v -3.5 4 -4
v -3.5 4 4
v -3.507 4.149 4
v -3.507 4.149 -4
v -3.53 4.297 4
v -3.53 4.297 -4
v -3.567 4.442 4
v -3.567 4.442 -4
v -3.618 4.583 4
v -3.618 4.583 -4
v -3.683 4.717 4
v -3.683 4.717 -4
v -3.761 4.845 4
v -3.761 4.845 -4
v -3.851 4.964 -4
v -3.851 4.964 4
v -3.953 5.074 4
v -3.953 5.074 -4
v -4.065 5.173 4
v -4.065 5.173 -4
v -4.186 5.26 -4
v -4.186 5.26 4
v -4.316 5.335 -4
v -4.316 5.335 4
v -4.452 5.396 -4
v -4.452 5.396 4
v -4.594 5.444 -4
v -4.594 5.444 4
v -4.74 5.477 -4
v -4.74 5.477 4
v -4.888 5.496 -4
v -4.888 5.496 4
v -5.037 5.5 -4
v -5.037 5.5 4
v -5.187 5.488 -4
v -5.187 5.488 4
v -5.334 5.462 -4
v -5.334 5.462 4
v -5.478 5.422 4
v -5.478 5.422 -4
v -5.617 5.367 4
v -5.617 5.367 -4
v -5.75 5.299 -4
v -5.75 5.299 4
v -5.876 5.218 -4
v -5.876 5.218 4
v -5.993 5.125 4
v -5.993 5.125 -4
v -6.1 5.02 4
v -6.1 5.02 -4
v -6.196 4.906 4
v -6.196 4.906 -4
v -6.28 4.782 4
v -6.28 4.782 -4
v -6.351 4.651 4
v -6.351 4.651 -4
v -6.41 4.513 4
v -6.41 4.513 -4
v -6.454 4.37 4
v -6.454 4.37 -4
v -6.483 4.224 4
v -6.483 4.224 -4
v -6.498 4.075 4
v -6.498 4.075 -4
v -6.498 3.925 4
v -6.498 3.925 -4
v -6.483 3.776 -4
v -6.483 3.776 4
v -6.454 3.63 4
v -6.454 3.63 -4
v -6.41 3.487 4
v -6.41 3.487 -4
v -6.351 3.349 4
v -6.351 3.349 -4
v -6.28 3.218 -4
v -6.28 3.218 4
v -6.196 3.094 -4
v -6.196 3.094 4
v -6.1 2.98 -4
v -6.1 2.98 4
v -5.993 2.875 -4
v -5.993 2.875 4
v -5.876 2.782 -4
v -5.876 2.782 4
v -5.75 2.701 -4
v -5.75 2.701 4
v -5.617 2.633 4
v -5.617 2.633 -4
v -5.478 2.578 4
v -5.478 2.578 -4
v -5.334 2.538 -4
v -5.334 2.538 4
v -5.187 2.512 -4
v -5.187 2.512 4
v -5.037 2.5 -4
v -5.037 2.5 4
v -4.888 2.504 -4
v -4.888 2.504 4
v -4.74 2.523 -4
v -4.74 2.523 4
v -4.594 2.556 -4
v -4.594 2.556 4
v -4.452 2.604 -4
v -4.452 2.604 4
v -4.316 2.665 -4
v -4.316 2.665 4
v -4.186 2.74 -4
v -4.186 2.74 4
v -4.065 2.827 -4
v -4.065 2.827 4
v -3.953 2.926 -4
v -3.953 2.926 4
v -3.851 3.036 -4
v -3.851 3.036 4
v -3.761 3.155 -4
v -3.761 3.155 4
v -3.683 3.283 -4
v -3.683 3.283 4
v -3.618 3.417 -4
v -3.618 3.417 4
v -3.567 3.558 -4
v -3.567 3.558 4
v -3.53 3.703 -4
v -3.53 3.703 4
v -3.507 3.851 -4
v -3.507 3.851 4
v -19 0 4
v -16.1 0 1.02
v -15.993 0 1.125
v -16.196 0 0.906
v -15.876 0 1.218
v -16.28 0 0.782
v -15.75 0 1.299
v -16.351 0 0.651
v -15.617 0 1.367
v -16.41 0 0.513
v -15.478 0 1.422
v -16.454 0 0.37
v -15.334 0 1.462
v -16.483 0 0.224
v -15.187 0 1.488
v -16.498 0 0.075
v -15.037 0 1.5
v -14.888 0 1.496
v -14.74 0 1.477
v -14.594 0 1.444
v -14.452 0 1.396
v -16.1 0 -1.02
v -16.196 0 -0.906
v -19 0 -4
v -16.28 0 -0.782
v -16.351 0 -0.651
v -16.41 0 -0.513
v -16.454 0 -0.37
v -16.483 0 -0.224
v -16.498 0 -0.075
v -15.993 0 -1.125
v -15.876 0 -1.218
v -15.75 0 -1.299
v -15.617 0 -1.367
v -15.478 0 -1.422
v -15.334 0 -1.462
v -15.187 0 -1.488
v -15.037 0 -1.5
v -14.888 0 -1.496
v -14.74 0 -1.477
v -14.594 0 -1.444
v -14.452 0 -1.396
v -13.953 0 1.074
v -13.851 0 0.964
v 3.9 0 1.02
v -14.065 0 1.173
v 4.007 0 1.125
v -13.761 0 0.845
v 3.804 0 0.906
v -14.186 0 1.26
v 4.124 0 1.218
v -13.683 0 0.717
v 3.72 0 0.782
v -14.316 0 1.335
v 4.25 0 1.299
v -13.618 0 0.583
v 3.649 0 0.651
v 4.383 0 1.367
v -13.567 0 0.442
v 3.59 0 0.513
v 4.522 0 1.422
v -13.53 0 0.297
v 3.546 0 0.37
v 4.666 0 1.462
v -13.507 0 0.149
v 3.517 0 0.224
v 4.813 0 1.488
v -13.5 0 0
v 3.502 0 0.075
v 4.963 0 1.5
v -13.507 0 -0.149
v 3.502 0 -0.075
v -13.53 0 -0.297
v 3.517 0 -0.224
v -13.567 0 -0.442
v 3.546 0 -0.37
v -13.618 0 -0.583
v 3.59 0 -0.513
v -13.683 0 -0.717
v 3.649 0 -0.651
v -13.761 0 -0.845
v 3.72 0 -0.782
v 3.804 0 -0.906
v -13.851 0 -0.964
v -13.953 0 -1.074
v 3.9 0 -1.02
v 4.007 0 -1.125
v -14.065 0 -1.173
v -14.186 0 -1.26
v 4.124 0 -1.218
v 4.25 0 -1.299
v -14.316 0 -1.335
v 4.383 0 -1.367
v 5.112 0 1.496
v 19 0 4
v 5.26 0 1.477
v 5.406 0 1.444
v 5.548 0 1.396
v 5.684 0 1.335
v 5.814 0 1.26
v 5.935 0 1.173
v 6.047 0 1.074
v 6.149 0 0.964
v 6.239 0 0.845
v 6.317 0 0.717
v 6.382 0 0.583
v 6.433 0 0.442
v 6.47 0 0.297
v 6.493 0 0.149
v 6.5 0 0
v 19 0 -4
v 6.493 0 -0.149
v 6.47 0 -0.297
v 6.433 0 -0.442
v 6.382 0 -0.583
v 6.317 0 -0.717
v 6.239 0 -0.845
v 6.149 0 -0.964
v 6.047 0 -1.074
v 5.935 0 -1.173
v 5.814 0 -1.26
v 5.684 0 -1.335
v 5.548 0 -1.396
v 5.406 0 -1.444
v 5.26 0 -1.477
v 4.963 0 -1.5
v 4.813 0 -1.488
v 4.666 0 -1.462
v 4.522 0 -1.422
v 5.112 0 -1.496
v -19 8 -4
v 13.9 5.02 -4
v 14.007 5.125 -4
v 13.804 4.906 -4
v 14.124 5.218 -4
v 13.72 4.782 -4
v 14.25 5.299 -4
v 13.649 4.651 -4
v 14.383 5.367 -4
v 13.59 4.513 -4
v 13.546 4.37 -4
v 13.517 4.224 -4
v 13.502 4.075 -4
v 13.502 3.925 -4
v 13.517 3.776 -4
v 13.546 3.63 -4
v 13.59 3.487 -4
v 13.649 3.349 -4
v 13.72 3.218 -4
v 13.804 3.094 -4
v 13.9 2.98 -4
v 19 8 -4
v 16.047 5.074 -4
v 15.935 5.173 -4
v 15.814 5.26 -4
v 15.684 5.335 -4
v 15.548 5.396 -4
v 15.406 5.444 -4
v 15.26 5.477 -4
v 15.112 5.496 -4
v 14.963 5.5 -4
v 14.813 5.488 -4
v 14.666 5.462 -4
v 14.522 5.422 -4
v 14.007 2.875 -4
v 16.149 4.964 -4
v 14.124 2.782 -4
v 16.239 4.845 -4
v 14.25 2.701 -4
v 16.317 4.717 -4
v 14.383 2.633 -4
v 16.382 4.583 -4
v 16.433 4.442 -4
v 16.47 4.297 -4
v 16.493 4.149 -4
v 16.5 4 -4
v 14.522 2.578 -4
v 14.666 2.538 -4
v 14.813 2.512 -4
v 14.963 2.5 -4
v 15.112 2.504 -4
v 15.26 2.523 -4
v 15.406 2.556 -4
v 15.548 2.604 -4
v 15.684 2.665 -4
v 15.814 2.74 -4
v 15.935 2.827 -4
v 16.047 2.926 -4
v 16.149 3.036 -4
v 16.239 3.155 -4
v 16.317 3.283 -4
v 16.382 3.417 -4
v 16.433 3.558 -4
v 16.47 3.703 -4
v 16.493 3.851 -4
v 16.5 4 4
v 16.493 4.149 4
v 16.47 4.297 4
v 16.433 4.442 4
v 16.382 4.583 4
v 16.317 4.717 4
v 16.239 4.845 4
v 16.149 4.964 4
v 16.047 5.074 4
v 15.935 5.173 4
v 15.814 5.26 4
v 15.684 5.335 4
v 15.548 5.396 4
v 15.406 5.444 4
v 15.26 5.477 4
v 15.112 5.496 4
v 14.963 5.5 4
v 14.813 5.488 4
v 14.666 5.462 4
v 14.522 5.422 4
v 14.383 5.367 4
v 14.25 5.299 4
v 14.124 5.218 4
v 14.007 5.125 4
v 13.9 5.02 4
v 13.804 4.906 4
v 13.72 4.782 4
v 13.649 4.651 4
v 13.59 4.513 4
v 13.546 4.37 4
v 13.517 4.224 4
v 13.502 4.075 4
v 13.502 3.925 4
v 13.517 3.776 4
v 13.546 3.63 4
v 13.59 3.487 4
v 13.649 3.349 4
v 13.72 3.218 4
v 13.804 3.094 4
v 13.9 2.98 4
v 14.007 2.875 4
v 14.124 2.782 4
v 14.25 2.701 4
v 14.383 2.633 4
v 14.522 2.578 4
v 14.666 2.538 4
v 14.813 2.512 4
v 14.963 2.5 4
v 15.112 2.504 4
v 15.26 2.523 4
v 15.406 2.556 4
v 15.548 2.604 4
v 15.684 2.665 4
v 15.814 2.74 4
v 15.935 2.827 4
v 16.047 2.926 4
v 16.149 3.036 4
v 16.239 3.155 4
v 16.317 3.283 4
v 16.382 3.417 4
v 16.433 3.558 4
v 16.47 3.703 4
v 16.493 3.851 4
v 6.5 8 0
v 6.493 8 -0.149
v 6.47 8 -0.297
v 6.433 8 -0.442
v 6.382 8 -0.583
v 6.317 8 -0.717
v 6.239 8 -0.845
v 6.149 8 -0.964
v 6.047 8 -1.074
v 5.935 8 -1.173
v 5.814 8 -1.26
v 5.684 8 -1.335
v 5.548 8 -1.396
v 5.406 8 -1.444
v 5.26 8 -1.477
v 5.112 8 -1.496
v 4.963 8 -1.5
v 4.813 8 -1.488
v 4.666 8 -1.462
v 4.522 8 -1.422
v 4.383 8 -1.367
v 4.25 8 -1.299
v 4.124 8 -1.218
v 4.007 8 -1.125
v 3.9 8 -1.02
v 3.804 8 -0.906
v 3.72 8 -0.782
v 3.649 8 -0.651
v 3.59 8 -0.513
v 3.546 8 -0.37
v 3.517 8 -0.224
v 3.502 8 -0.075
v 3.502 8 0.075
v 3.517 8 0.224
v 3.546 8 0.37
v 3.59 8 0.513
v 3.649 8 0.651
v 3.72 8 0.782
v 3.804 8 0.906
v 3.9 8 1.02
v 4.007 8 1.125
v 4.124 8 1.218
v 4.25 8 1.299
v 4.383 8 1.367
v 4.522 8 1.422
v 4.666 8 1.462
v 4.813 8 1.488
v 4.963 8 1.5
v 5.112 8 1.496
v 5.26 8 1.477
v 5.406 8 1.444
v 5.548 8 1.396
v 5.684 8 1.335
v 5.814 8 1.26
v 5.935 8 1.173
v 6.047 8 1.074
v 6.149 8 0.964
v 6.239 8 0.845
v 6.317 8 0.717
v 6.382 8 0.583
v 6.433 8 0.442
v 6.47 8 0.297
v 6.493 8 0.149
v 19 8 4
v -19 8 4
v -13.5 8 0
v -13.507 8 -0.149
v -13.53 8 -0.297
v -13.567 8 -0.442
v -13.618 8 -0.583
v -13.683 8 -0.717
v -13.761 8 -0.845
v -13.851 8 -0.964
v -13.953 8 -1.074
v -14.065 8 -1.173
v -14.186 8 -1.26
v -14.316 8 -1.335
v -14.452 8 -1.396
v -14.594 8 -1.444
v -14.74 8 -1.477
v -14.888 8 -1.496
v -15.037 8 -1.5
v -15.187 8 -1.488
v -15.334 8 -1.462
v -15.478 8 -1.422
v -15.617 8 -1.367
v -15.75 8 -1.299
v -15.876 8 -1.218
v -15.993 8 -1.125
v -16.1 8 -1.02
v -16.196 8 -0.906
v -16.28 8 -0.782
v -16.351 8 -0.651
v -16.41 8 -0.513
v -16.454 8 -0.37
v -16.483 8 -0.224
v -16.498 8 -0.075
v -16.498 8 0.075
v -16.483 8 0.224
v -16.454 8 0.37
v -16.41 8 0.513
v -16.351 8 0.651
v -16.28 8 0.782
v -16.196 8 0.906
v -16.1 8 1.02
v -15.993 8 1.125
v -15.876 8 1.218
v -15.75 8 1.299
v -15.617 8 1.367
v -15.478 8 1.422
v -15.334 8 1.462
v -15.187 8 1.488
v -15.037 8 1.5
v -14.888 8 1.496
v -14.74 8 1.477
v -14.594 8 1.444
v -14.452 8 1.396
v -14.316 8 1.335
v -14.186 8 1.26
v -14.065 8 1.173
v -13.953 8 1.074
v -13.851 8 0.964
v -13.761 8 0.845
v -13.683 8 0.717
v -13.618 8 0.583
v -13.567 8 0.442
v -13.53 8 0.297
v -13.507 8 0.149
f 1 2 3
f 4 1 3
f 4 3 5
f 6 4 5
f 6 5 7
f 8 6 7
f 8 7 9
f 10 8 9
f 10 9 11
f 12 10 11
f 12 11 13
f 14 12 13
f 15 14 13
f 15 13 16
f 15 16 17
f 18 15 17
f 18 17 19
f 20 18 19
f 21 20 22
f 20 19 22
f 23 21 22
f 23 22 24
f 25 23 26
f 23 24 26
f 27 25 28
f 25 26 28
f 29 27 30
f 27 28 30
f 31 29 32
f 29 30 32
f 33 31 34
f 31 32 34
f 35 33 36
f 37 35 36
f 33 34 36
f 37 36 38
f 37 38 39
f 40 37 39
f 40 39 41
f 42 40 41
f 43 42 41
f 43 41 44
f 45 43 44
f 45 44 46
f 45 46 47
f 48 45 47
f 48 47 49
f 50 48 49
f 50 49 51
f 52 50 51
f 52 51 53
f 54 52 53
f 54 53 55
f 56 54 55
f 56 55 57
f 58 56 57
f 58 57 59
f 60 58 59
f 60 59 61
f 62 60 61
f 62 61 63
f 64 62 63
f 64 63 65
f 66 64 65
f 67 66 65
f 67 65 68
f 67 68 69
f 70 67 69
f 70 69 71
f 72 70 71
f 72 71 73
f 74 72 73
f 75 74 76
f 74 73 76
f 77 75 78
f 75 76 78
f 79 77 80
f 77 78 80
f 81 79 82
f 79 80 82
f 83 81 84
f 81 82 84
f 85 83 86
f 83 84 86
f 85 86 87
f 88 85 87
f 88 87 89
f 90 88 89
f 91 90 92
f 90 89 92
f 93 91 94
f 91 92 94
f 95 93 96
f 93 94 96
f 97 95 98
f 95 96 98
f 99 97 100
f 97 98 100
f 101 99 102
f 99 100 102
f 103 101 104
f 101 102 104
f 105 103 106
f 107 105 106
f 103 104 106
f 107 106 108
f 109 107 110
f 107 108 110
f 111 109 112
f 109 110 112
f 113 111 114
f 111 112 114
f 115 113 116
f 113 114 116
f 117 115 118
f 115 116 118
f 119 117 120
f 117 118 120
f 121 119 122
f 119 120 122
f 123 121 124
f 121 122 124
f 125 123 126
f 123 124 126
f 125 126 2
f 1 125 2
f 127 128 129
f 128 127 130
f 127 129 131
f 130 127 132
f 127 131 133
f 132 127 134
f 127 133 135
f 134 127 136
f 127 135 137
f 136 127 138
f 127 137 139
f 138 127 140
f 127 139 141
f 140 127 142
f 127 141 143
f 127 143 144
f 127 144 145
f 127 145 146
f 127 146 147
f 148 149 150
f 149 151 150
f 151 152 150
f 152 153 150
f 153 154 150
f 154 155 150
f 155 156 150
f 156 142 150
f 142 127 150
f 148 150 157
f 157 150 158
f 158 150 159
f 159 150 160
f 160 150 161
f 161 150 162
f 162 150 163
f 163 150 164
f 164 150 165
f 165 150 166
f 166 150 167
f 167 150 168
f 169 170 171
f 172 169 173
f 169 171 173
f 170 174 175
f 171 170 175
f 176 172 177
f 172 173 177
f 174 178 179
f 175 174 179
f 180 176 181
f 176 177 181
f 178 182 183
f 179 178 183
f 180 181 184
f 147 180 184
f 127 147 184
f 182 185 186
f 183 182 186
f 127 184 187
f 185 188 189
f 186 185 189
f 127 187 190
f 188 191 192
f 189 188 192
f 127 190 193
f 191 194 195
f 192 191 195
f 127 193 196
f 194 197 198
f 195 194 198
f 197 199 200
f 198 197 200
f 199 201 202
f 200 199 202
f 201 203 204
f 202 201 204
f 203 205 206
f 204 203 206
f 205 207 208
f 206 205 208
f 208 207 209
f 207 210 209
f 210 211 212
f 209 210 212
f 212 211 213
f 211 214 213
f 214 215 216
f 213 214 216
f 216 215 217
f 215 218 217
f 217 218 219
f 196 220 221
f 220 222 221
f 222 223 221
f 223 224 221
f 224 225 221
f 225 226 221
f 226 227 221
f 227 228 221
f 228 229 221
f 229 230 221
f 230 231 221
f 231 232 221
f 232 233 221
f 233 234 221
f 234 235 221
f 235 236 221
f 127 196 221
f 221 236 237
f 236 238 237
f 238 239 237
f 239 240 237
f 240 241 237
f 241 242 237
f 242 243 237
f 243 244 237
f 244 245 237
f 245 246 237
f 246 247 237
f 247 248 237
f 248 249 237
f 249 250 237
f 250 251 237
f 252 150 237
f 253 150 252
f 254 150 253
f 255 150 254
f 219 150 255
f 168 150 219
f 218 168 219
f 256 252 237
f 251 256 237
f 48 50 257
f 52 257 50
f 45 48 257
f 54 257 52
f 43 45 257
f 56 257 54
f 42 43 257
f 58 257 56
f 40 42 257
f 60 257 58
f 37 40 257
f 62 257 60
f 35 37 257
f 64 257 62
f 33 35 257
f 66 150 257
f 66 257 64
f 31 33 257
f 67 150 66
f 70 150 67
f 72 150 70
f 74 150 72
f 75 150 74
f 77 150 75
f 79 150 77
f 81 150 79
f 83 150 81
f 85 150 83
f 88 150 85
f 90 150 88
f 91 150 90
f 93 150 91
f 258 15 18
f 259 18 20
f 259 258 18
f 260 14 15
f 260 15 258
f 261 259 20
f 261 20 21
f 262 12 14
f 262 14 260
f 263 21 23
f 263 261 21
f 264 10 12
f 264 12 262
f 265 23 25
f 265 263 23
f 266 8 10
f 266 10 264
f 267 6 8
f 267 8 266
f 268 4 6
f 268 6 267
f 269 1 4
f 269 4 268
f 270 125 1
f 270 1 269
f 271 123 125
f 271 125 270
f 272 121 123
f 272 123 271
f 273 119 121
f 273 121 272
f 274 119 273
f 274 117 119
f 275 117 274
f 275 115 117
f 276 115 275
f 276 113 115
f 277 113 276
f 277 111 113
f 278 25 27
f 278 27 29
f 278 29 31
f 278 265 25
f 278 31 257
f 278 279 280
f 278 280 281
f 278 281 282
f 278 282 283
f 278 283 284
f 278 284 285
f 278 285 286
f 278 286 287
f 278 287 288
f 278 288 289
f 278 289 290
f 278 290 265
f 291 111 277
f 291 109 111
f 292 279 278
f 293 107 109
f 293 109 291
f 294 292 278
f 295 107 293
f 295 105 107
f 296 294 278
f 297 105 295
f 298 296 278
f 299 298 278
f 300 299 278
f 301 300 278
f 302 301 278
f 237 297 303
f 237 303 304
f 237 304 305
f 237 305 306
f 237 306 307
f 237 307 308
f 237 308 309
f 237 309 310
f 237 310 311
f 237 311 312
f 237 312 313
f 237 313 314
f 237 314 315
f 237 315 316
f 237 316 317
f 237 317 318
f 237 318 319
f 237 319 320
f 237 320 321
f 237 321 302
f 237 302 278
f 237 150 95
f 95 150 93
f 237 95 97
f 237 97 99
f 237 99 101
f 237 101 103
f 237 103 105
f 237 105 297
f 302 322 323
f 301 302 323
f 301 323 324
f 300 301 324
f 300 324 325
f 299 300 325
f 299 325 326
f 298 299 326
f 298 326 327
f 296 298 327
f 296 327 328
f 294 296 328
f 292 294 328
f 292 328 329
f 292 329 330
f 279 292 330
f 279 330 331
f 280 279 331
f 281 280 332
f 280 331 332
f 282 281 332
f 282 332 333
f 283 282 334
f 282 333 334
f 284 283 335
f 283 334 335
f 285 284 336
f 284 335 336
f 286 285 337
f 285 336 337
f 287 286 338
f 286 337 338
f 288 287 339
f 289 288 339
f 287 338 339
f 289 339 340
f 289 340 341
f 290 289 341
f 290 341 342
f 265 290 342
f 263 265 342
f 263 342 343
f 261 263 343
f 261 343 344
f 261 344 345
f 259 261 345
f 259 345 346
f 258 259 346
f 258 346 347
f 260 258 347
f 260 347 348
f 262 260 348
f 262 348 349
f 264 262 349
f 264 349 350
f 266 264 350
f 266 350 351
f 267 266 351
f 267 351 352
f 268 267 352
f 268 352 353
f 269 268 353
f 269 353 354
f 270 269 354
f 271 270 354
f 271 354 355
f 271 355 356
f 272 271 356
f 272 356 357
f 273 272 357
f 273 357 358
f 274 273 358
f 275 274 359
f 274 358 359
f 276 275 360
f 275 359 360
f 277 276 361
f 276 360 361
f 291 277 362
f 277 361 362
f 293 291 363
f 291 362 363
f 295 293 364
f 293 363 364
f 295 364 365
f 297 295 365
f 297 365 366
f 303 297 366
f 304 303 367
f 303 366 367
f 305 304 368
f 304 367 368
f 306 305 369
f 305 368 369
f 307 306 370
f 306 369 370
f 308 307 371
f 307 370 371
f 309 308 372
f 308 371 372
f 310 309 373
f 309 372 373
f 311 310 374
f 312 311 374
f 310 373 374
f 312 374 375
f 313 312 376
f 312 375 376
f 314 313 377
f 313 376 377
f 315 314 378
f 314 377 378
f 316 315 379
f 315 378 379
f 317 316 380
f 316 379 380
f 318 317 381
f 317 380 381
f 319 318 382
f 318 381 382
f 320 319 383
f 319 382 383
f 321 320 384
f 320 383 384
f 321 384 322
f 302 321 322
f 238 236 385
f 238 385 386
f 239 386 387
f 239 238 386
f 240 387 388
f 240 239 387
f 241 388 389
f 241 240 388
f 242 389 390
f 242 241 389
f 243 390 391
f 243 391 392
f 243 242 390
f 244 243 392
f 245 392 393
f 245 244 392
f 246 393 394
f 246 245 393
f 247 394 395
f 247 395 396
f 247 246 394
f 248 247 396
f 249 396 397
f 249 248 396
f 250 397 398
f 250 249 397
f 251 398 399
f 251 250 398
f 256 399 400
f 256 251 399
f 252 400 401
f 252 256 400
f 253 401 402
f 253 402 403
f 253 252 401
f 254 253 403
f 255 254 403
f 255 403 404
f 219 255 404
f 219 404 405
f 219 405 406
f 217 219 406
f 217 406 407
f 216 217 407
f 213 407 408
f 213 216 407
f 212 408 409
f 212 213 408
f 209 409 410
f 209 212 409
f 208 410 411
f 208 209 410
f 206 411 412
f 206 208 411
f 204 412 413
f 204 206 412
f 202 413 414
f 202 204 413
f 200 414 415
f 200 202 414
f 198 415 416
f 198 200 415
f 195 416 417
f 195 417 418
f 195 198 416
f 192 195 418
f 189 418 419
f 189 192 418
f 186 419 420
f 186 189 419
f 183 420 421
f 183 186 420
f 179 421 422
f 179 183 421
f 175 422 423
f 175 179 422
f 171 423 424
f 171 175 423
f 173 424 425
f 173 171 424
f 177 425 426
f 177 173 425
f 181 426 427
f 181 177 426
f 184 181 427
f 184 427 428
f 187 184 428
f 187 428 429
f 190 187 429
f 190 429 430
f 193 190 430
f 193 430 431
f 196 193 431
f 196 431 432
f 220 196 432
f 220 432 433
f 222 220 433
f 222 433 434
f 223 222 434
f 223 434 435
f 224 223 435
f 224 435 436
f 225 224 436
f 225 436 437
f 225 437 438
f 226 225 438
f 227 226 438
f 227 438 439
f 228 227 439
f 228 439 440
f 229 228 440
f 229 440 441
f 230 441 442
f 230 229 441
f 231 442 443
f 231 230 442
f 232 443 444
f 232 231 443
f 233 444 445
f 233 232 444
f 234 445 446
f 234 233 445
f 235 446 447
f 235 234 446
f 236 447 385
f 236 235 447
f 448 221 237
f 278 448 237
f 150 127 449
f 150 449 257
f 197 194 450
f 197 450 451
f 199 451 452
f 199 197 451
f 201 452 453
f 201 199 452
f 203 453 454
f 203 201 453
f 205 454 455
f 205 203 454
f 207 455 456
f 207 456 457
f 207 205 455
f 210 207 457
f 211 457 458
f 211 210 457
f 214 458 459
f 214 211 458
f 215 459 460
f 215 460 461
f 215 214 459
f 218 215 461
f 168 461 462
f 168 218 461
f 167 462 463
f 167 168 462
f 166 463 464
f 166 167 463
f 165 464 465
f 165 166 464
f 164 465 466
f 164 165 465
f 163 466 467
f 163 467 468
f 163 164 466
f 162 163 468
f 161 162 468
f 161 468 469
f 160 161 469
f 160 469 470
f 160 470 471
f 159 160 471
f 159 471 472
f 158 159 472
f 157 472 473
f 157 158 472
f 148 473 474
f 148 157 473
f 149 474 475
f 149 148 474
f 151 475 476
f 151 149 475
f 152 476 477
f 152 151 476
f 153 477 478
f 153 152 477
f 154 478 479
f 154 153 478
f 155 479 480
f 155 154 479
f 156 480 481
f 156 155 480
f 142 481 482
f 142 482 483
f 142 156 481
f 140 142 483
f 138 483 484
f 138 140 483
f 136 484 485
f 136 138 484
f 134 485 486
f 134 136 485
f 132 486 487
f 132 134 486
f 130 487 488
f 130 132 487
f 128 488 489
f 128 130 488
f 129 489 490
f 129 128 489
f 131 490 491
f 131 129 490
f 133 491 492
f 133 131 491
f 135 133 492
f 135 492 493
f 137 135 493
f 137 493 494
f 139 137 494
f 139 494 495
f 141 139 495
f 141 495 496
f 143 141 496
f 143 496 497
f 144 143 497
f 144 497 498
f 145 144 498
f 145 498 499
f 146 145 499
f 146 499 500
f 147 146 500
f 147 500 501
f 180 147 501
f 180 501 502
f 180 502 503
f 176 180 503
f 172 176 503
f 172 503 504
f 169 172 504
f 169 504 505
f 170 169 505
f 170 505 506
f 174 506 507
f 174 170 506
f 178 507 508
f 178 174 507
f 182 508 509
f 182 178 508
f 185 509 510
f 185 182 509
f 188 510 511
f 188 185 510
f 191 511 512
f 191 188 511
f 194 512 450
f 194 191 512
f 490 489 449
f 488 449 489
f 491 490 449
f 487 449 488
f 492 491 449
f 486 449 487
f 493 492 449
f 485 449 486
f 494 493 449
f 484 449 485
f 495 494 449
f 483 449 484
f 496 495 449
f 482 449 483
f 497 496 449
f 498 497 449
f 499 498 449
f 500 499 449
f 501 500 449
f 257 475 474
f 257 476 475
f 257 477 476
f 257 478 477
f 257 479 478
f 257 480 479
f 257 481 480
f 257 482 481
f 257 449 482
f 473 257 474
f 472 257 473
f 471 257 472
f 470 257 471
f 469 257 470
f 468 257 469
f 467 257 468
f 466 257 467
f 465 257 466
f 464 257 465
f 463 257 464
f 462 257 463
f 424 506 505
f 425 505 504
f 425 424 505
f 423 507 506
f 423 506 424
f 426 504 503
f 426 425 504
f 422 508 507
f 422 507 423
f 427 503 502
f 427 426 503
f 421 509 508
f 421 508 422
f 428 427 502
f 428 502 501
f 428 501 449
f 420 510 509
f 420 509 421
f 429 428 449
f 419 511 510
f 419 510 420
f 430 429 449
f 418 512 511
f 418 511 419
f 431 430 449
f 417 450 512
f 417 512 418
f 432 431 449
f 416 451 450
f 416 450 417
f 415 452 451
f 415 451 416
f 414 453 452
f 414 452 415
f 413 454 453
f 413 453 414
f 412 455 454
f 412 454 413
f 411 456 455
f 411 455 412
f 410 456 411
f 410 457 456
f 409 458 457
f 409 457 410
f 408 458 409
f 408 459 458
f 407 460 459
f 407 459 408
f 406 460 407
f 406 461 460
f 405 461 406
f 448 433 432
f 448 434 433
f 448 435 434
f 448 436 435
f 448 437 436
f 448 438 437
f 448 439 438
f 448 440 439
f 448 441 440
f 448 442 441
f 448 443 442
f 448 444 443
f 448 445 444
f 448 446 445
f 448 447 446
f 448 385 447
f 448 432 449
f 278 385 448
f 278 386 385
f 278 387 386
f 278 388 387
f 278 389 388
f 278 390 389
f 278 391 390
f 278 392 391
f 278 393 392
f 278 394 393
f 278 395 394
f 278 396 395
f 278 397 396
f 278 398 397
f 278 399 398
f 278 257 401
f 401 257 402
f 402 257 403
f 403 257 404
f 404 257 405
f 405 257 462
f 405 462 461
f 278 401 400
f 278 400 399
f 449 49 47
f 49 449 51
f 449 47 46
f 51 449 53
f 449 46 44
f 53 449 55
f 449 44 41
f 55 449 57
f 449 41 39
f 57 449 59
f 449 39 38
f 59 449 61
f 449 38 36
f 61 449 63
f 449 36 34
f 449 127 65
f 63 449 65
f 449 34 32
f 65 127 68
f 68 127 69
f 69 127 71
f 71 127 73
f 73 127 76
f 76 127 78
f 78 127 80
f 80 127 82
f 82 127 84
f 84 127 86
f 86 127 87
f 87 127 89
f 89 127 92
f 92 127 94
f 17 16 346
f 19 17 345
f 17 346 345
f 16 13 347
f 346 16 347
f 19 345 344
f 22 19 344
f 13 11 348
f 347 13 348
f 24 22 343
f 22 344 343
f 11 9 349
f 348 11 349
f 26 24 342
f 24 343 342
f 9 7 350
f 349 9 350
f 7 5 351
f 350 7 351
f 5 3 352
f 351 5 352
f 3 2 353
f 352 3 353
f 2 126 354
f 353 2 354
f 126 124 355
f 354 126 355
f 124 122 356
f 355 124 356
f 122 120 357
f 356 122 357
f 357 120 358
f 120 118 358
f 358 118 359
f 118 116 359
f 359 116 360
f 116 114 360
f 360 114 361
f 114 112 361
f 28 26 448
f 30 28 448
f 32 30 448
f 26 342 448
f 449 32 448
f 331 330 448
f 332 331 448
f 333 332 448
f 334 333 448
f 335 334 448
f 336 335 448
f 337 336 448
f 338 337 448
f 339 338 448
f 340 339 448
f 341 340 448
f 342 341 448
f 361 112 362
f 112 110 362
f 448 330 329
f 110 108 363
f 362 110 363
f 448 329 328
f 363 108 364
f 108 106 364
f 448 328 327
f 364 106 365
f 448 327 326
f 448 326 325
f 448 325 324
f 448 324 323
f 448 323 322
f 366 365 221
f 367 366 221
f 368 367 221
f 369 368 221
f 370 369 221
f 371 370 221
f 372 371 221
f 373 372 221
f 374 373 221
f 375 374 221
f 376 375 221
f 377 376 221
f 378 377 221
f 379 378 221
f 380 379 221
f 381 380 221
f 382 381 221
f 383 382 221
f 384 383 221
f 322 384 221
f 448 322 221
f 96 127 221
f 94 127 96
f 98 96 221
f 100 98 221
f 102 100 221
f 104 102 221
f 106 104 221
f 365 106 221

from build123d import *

# Parameters (mm, degrees)
SKETCH_1_W          = 38
SKETCH_1_H          = 8
SKETCH_1_R          = 1.5
EXTRUDE_1_DEPTH     = 8
SKETCH_2_R          = 1.5
CUT_EXTRUDE_1_DEPTH = 9


with BuildPart() as part:
    # 草图1 → 凸台-拉伸1 (new body)
    with BuildSketch(Plane(origin=(0, 0, 0), x_dir=(1, 0, 0), z_dir=(0, 1, 0))):
        Rectangle(SKETCH_1_W, SKETCH_1_H)
        with Locations((-15, 0)):
            Circle(SKETCH_1_R, mode=Mode.SUBTRACT)
        with Locations((5, 0)):
            Circle(SKETCH_1_R, mode=Mode.SUBTRACT)
    extrude(amount=EXTRUDE_1_DEPTH)

    # 草图2 → 切除-拉伸1 (cut, through all)
    with BuildSketch(Plane.XY.offset(4)):
        with Locations((-5, 4)):
            Circle(SKETCH_2_R)
        with Locations((15, 4)):
            Circle(SKETCH_2_R)
    extrude(amount=-CUT_EXTRUDE_1_DEPTH, mode=Mode.SUBTRACT)


solid = part.part
